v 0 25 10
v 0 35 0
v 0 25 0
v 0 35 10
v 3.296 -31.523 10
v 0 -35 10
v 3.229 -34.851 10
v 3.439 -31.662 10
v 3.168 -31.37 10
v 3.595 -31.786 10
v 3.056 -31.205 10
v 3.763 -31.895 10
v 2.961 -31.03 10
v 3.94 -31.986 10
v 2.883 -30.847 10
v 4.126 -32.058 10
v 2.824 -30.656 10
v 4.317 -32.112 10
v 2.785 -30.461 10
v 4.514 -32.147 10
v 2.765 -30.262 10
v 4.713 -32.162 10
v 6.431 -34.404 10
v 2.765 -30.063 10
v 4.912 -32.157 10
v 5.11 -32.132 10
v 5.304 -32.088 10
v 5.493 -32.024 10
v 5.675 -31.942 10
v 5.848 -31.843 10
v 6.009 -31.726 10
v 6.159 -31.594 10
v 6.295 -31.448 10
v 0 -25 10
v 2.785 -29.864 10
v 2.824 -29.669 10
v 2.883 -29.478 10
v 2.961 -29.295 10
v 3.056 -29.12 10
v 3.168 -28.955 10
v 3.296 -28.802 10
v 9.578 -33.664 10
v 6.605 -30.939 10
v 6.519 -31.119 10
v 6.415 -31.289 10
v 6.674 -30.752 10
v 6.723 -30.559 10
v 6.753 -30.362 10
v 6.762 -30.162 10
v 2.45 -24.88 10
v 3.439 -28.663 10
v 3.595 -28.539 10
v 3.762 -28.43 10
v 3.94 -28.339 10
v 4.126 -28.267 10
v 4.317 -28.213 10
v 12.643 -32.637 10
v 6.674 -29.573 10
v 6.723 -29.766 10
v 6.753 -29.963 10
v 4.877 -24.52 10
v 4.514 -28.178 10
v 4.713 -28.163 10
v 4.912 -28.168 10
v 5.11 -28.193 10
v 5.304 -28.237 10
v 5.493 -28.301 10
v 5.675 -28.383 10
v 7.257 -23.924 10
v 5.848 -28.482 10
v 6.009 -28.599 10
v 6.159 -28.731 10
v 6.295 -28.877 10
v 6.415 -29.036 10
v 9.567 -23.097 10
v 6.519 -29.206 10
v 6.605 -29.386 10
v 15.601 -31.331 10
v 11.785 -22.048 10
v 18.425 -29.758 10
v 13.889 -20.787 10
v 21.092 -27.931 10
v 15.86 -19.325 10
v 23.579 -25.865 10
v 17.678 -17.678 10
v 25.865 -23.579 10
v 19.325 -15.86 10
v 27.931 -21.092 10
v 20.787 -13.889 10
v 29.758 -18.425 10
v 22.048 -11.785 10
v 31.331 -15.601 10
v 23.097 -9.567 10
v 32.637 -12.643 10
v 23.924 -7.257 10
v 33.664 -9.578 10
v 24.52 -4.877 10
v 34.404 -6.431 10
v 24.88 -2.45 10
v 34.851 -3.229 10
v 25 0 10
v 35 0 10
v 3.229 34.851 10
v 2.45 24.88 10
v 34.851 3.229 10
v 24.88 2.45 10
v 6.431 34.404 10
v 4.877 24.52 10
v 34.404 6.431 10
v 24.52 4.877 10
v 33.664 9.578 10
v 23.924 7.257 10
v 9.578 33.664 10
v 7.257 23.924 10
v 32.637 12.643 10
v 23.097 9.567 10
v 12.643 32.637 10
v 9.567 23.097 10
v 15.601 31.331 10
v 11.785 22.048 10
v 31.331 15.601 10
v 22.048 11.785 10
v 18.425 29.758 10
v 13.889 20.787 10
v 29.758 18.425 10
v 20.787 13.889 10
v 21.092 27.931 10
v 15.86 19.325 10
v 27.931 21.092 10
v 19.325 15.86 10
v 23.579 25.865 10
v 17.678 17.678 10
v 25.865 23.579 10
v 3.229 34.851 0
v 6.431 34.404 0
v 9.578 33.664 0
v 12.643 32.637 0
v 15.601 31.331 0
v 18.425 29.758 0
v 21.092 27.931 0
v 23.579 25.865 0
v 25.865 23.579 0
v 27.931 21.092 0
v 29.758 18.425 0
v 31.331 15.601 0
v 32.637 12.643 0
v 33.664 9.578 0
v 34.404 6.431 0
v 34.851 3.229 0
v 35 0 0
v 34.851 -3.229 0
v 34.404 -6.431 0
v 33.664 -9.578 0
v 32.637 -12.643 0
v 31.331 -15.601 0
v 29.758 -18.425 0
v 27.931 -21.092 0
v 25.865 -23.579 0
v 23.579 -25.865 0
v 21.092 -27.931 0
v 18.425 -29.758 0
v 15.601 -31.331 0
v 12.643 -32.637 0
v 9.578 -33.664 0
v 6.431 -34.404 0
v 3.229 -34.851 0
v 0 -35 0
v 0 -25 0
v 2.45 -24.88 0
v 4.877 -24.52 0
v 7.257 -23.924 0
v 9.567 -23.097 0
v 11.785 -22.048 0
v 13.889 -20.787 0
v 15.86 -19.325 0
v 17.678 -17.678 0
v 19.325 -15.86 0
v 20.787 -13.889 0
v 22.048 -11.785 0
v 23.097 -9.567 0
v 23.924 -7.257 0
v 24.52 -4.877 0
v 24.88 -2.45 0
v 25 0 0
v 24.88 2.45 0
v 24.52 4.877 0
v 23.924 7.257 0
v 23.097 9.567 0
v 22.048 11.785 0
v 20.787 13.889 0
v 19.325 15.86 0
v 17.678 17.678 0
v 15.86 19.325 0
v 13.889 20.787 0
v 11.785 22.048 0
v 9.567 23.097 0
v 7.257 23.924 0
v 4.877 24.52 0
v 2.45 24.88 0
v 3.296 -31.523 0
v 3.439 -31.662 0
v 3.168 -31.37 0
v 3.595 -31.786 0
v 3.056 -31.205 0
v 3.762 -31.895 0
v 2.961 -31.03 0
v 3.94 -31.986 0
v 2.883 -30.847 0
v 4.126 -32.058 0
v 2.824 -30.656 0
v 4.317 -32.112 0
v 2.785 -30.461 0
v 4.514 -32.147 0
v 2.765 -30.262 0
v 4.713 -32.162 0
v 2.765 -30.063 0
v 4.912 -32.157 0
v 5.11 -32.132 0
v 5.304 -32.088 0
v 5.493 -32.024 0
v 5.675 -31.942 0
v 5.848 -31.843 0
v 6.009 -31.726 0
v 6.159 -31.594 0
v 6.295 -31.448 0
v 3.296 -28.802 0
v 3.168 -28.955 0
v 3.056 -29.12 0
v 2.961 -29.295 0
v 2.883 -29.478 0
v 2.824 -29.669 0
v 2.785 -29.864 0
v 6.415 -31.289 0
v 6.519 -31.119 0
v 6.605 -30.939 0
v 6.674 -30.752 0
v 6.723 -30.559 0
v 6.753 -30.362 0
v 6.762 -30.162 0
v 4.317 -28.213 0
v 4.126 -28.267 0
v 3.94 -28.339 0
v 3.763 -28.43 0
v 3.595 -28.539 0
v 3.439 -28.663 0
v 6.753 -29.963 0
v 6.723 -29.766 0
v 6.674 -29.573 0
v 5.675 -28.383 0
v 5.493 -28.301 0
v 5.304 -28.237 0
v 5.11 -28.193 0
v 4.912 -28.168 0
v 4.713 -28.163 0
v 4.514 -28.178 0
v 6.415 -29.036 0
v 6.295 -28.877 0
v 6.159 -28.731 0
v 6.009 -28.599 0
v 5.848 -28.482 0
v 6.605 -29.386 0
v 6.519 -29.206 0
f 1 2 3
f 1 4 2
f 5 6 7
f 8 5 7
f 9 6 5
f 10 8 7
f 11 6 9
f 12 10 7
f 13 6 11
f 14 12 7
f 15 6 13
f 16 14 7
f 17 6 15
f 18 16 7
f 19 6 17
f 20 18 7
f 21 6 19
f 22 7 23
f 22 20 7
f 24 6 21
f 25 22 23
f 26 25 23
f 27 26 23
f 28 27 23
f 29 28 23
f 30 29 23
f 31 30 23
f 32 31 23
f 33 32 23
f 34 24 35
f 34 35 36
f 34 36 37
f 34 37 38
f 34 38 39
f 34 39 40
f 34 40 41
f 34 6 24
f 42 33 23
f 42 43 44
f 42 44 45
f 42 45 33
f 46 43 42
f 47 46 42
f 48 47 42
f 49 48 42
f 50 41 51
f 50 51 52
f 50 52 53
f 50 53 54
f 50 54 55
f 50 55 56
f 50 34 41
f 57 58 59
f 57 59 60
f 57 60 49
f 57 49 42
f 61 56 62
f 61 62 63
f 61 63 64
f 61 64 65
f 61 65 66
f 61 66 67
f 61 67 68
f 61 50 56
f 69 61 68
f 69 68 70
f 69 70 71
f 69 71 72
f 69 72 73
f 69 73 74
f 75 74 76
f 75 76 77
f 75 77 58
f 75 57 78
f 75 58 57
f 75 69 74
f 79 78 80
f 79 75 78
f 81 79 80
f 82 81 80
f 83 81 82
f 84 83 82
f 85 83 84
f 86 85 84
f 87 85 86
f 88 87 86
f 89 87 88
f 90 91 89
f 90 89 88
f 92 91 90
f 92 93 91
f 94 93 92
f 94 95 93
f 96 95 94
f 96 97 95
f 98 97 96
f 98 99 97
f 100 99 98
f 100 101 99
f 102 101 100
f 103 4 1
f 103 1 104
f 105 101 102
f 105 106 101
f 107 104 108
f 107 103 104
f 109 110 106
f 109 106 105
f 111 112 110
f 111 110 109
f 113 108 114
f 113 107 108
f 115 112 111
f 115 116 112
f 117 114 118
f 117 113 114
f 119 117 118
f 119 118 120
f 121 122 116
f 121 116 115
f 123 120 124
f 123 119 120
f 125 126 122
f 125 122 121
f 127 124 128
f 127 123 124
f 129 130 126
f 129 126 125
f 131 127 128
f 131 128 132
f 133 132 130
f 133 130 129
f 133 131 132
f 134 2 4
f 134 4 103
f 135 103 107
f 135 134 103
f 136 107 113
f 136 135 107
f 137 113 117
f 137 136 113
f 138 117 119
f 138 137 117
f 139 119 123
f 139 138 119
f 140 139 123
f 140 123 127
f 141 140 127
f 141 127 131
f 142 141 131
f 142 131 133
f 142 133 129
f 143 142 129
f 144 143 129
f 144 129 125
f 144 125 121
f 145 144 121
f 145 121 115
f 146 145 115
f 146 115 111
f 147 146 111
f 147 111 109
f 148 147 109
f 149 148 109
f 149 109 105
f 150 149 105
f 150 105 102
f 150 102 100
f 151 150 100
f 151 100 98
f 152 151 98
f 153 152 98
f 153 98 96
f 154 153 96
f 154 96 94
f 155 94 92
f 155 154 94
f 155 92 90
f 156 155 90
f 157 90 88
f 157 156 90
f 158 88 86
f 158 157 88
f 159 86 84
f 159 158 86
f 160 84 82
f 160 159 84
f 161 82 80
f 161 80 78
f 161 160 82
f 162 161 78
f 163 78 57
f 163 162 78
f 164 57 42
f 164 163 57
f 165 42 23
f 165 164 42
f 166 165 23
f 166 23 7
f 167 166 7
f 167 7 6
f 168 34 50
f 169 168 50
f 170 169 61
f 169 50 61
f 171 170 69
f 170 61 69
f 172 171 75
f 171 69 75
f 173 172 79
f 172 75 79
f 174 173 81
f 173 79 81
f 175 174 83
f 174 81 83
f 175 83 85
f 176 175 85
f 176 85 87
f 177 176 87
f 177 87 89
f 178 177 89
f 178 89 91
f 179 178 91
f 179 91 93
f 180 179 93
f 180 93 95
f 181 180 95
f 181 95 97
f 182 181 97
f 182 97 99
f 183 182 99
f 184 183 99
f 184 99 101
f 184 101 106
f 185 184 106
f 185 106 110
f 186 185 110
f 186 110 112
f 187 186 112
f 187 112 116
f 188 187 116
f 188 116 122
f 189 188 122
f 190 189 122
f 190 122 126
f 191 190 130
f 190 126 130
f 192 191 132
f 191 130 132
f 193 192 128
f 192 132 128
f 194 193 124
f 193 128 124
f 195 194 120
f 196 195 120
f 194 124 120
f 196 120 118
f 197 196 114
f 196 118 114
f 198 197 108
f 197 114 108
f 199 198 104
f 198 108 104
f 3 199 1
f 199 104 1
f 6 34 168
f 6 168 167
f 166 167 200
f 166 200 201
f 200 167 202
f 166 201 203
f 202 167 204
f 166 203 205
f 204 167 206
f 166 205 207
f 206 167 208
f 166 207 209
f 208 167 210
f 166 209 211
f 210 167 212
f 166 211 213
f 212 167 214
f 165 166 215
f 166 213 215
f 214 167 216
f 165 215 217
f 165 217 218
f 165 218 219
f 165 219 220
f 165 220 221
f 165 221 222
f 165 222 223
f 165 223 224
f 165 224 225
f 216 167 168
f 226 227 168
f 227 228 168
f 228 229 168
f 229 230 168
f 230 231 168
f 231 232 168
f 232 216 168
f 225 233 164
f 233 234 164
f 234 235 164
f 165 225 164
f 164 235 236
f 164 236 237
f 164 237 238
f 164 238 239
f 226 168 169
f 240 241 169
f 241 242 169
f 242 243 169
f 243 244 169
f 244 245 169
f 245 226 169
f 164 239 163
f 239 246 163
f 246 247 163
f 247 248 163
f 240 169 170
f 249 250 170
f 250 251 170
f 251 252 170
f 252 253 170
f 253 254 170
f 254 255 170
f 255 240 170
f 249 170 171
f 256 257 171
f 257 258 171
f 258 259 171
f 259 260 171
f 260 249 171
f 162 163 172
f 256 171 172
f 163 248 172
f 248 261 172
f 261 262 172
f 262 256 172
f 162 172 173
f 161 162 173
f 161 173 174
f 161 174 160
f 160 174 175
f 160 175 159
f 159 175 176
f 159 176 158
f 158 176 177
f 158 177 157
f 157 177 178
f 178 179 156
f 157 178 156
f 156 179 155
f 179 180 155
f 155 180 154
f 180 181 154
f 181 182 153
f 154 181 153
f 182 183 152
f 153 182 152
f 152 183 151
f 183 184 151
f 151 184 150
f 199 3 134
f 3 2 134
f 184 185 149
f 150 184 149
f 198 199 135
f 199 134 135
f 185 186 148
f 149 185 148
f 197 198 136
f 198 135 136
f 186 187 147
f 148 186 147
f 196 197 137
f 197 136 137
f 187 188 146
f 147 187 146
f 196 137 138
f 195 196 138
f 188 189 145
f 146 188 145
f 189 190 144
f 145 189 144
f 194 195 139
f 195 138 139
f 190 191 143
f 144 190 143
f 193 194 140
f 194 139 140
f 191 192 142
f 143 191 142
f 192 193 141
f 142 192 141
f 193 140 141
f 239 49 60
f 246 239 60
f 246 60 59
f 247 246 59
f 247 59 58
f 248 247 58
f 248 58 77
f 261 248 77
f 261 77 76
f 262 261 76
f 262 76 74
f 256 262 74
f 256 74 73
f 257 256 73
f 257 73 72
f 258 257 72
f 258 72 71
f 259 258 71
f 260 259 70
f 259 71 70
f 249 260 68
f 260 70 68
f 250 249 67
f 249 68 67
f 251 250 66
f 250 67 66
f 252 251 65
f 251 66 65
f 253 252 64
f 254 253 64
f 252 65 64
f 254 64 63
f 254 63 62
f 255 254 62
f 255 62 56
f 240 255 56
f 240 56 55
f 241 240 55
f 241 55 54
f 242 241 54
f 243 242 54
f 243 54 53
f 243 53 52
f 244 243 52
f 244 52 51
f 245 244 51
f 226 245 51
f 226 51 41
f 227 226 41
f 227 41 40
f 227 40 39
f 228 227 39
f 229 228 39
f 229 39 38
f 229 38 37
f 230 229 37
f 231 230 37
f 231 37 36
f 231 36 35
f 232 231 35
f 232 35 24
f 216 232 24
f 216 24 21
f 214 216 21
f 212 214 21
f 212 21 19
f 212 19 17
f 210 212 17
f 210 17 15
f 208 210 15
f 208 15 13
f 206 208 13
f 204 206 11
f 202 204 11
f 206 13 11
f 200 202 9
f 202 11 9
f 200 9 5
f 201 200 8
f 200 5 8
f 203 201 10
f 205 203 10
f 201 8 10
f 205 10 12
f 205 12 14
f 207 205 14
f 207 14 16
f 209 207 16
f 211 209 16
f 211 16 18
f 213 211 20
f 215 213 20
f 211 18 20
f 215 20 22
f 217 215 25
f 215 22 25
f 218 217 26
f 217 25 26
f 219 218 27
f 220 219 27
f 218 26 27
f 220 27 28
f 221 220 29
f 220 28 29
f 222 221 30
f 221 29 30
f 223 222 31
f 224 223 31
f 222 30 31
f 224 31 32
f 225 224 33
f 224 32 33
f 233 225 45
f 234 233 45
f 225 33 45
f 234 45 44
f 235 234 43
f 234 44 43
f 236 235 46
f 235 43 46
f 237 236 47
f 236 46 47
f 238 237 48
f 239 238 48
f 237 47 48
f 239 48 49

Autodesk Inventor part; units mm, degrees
ref_plane "YZ Plane" through (0, 0, 0) normal (1, 0, 0) x (0, 1, 0)
ref_plane "XZ Plane" through (0, 0, 0) normal (0, 1, 0) x (-1, 0, 0)
ref_plane "XY Plane" through (0, 0, 0) normal (0, 0, 1) x (1, 0, 0)
sketch "Sketch1" plane through (0, 0, 0) normal (0, 0, 1) x (1, 0, 0)
  circle A0 centre (0, 0) radius 35
  dimension "d0" = 70
extrude "Extrusion1" add sketch "Sketch1" along normal blind 10
sketch "Sketch2" plane through (0, 0, 10) normal (0, 0, 1) x (1, 0, 0)
  circle A0 centre (0, 0) radius 25
  line L0 (0, 34.925) -> (0, 25)
  line L1 (0, -25) -> (0, -34.925)
  line L2 (0, -30.1625) -> (4.7625, -30.1625)
  circle A1 centre (4.7625, -30.1625) radius 2
  dimension "d3" = 50
  dimension "d4" = 4
extrude "Extrusion2" cut sketch "Sketch2" against normal blind 10
sketch "Sketch3" plane through (0, 0, 10) normal (0, 0, 1) x (1, 0, 0)
  circle A0 centre (0, 0) radius 35 projected
  line L0 (0, 35) -> (0, -35)
extrude "Extrusion3" cut sketch "Sketch3" against normal blind 10 contours L0 A0 picked at (-19.0322, -1.7332)
properties part number "5"
